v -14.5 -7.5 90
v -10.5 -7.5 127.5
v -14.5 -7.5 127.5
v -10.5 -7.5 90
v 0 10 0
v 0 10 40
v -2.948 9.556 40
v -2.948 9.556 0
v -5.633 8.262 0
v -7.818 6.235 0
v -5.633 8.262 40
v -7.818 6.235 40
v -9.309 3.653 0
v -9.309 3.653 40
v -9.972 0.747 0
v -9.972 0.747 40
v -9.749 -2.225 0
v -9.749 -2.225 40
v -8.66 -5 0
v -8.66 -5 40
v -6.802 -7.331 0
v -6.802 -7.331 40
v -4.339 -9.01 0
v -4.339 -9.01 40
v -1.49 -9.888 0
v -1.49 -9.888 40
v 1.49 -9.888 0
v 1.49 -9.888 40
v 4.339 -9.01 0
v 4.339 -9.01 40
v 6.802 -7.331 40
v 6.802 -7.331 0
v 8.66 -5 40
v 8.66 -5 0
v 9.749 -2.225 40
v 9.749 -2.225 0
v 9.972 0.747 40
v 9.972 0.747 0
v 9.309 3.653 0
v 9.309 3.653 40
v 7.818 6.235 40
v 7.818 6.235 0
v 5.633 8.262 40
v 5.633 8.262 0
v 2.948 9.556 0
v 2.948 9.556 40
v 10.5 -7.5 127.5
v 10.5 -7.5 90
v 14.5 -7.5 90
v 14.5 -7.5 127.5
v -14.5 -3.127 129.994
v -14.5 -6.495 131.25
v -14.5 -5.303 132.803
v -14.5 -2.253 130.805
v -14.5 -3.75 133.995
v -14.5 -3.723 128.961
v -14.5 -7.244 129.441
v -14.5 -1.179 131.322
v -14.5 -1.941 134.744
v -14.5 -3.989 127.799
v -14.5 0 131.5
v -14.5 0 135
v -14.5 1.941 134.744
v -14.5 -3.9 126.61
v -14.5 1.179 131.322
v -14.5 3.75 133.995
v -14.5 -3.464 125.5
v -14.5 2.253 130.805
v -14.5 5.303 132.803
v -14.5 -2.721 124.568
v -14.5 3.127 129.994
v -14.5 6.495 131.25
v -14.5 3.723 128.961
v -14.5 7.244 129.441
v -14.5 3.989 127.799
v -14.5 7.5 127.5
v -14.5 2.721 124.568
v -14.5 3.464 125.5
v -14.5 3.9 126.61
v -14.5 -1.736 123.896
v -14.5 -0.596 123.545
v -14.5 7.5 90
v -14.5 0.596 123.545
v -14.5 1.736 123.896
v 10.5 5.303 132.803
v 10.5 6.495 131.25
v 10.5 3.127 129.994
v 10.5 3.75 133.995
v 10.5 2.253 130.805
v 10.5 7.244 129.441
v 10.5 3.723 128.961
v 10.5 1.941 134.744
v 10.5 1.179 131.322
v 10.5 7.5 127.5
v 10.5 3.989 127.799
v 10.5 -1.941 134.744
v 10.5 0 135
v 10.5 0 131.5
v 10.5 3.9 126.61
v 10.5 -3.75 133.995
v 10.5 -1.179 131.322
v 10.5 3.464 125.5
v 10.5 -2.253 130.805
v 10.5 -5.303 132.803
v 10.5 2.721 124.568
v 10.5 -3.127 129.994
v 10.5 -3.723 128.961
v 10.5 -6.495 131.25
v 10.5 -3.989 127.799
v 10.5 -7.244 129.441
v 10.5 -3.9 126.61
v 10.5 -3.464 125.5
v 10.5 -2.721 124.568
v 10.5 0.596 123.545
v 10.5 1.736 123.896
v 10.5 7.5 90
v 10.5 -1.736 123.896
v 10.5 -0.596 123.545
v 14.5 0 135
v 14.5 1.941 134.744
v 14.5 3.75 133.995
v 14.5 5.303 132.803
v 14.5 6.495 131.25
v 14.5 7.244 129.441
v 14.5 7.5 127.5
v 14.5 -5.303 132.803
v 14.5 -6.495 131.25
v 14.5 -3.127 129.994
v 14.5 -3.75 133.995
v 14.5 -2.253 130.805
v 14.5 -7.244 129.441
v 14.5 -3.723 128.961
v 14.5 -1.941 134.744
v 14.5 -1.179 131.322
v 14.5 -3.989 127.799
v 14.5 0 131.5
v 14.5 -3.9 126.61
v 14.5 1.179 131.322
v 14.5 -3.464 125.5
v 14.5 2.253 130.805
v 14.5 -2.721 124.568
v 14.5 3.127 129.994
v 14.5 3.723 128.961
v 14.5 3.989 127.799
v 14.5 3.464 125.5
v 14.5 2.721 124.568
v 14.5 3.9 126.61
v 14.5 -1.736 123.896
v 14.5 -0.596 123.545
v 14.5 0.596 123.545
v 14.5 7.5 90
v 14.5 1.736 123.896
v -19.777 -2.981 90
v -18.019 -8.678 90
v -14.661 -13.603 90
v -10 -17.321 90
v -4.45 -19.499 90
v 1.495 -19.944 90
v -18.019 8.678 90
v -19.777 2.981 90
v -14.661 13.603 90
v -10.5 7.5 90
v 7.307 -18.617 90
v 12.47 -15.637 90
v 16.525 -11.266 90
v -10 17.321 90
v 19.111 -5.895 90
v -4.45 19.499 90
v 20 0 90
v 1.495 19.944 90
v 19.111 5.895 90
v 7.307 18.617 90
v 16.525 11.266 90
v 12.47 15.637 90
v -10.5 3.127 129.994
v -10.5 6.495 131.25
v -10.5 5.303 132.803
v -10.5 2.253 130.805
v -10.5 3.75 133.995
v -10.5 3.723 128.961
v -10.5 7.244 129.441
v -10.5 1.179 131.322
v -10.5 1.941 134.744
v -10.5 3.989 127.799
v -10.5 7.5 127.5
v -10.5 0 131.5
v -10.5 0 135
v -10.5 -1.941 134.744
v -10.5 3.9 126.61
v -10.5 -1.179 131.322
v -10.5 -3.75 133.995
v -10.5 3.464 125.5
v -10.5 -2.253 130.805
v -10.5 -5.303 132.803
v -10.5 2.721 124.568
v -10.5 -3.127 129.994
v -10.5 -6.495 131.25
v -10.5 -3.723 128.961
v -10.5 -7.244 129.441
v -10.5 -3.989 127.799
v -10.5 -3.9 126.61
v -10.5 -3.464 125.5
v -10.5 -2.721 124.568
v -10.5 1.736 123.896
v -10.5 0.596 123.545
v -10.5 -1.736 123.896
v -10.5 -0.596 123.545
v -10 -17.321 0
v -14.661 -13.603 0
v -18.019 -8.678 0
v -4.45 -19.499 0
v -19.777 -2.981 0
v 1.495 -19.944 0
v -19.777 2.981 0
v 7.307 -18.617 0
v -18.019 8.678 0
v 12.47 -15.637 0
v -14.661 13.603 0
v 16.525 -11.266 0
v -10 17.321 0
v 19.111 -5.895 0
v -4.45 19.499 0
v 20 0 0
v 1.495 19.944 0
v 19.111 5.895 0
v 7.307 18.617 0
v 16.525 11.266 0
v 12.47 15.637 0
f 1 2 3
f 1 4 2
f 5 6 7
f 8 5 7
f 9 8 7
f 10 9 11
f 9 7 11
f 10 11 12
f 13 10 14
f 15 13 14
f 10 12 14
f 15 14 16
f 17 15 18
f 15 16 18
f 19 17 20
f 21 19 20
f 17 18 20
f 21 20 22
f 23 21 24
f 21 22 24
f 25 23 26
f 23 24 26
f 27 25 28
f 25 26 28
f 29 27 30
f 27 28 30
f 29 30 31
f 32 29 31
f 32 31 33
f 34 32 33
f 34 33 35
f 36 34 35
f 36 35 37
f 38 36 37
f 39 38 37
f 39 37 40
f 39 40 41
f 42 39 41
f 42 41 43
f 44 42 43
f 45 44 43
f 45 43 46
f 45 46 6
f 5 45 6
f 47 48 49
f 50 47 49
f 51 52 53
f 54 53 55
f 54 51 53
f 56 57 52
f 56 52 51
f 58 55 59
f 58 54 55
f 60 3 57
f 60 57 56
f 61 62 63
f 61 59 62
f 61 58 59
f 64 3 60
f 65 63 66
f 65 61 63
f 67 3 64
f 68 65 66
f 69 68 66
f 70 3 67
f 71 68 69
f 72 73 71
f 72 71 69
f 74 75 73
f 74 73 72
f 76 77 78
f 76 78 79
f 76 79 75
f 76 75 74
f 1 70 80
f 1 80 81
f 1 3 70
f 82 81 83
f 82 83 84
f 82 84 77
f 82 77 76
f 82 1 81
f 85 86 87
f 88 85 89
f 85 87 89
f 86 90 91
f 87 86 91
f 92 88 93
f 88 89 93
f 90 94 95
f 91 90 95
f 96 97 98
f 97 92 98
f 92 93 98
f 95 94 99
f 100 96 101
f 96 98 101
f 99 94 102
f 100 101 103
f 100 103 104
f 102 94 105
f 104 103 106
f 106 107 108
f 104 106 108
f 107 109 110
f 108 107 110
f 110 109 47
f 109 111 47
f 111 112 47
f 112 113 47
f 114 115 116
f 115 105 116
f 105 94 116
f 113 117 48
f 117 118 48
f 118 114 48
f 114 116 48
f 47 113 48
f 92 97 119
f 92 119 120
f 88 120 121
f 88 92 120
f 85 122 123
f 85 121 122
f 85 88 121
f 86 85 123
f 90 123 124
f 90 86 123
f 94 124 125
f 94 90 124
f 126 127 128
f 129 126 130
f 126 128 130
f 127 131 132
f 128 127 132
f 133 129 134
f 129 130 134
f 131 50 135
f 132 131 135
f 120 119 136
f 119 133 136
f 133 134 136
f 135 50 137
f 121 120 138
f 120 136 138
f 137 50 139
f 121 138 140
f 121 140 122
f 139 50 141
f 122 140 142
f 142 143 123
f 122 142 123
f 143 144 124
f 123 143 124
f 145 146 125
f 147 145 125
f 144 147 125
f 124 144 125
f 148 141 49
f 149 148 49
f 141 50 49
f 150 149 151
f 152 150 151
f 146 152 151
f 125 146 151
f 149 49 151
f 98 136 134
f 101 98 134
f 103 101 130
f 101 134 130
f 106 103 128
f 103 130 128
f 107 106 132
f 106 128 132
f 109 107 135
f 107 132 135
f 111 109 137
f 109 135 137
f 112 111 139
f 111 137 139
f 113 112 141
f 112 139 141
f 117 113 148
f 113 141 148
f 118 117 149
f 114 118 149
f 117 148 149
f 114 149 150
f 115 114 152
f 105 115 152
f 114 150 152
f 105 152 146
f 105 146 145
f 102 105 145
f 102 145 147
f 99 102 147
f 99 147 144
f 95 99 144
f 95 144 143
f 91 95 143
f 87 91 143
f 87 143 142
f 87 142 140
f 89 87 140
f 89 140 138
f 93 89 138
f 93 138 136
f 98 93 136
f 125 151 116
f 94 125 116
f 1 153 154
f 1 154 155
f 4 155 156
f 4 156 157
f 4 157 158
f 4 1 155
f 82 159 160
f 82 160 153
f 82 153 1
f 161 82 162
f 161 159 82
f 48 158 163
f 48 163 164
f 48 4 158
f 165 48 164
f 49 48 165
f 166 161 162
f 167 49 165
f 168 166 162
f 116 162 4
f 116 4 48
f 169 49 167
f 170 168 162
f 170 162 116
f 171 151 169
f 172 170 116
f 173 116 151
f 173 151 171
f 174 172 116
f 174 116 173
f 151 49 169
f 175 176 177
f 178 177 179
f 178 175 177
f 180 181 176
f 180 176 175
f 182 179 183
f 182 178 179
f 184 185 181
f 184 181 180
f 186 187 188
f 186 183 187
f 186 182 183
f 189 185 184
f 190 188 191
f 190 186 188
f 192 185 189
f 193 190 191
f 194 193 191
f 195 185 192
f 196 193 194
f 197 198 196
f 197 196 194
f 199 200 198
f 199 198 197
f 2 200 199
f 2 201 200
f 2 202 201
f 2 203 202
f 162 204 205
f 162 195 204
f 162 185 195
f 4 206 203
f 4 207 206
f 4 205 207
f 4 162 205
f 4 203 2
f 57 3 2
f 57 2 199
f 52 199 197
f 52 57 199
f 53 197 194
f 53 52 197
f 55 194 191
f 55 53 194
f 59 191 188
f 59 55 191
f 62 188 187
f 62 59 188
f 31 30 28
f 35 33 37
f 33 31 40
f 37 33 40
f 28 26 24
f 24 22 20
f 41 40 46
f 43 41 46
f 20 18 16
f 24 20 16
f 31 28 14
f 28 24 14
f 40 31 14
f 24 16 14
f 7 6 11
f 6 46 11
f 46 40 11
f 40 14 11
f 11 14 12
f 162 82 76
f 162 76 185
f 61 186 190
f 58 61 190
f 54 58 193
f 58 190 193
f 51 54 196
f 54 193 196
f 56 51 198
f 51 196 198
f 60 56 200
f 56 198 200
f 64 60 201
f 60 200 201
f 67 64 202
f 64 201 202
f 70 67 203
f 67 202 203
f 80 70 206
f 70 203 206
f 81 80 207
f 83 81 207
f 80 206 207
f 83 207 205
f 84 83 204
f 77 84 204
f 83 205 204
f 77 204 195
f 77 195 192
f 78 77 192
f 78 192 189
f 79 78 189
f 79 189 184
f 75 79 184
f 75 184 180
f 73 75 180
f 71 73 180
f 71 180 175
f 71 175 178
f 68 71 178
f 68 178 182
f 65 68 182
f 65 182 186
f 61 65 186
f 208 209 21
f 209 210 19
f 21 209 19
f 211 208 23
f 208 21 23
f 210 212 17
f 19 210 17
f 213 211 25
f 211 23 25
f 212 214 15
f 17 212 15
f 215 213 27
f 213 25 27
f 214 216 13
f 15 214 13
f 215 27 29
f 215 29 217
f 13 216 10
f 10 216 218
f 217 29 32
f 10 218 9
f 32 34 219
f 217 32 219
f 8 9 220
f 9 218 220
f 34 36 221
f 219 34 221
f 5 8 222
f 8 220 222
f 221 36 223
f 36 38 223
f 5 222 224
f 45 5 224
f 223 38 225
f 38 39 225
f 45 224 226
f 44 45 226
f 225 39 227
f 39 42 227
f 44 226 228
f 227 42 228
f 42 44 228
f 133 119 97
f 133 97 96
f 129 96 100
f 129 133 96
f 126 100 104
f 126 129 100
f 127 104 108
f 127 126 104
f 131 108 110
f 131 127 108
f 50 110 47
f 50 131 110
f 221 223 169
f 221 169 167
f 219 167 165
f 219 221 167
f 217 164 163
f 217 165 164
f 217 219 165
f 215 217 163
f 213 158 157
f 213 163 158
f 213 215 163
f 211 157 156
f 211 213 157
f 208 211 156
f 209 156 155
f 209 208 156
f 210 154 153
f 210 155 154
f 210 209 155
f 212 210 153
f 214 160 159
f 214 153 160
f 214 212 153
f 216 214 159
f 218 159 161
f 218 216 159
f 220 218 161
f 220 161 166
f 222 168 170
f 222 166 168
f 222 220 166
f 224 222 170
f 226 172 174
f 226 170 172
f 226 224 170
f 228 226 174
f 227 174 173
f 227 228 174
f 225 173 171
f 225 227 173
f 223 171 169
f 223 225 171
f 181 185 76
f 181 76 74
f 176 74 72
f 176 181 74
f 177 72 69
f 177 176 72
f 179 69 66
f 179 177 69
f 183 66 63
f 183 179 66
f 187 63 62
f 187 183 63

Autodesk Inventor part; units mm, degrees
ref_plane "YZ Plane" through (0, 0, 0) normal (1, 0, 0) x (0, 1, 0)
ref_plane "XZ Plane" through (0, 0, 0) normal (0, 1, 0) x (-1, 0, 0)
ref_plane "XY Plane" through (0, 0, 0) normal (0, 0, 1) x (1, 0, 0)
sketch "草图1" plane through (0, 0, 0) normal (0, 0, 1) x (1, 0, 0)
  circle A0 centre (0, 0) radius 20 projected
  circle A1 centre (0, 0) radius 10 projected
  point P0 (0, 0)
extrude "拉伸1" add sketch "草图1" along normal blind 40 contours A0 | A1
sketch "草图2" plane through (0, 0, 40) normal (0, 0, 1) x (1, 0, 0)
  circle A0 centre (0, 0) radius 20 projected
  point P0 (0, 0)
extrude "拉伸2" add sketch "草图2" along normal blind 50
sketch "草图3" plane through (0, 0, 90) normal (0, 0, 1) x (1, 0, 0)
  line L0 (0, 0) -> (0, 22.0262)
  line L1 (-10.5, -7.5) -> (-14.5, -7.5)
  line L2 (-14.5, -7.5) -> (-14.5, 7.5)
  line L3 (-14.5, 7.5) -> (-10.5, 7.5)
  line L4 (-10.5, 7.5) -> (-10.5, -7.5)
  line L5 (-10.5, -7.5) -> (-14.5, 7.5) construction
  line L6 (-14.5, -7.5) -> (-10.5, 7.5) construction
  line L7 (10.5, -7.5) -> (14.5, -7.5)
  line L8 (14.5, -7.5) -> (14.5, 7.5)
  line L9 (14.5, 7.5) -> (10.5, 7.5)
  line L10 (10.5, 7.5) -> (10.5, -7.5)
  line L11 (10.5, -7.5) -> (14.5, 7.5) construction
  line L12 (14.5, -7.5) -> (10.5, 7.5) construction
  point P0 (-12.5, 0)
  point P1 (12.5, 0)
  point P2 (-12.5, 0)
  dimension "d4" = 25
  dimension "d5" = 4
  dimension "d6" = 15
extrude "拉伸3" add sketch "草图3" along normal blind 45
full round fillet "全圆角1" first side at (-13.1667, -7.5, 105) centre faces at (-11.8333, -2.5, 135) second side at (-11.8333, 7.5, 105)
full round fillet "全圆角2" first side at (13.1667, 7.5, 105) centre faces at (13.1667, -2.5, 135) second side at (11.8333, -7.5, 105)
sketch "草图4" plane through (-14.5, -7.5, 90) normal (-1, 0, 0) x (0, 0, 1)
  arc A0 (37.5, 0) -> (37.5, 15) centre (37.5, 7.5) ccw projected
  point P0 (-90, 7.5)
hole "孔1" at (-14.5, 0, 127.5) direction (1, 0, 0) diameter 8 end through all
sketch "草图5" plane through (0, 0, 0) normal (0, 0, -1) x (-1, 0, 0)
  circle A0 centre (0, 0) radius 20 projected
  point P0 (0, 0)
hole "孔2" at (0, 0, 0) direction (0, 0, 1) diameter 20 depth 40
properties part number "节块"
